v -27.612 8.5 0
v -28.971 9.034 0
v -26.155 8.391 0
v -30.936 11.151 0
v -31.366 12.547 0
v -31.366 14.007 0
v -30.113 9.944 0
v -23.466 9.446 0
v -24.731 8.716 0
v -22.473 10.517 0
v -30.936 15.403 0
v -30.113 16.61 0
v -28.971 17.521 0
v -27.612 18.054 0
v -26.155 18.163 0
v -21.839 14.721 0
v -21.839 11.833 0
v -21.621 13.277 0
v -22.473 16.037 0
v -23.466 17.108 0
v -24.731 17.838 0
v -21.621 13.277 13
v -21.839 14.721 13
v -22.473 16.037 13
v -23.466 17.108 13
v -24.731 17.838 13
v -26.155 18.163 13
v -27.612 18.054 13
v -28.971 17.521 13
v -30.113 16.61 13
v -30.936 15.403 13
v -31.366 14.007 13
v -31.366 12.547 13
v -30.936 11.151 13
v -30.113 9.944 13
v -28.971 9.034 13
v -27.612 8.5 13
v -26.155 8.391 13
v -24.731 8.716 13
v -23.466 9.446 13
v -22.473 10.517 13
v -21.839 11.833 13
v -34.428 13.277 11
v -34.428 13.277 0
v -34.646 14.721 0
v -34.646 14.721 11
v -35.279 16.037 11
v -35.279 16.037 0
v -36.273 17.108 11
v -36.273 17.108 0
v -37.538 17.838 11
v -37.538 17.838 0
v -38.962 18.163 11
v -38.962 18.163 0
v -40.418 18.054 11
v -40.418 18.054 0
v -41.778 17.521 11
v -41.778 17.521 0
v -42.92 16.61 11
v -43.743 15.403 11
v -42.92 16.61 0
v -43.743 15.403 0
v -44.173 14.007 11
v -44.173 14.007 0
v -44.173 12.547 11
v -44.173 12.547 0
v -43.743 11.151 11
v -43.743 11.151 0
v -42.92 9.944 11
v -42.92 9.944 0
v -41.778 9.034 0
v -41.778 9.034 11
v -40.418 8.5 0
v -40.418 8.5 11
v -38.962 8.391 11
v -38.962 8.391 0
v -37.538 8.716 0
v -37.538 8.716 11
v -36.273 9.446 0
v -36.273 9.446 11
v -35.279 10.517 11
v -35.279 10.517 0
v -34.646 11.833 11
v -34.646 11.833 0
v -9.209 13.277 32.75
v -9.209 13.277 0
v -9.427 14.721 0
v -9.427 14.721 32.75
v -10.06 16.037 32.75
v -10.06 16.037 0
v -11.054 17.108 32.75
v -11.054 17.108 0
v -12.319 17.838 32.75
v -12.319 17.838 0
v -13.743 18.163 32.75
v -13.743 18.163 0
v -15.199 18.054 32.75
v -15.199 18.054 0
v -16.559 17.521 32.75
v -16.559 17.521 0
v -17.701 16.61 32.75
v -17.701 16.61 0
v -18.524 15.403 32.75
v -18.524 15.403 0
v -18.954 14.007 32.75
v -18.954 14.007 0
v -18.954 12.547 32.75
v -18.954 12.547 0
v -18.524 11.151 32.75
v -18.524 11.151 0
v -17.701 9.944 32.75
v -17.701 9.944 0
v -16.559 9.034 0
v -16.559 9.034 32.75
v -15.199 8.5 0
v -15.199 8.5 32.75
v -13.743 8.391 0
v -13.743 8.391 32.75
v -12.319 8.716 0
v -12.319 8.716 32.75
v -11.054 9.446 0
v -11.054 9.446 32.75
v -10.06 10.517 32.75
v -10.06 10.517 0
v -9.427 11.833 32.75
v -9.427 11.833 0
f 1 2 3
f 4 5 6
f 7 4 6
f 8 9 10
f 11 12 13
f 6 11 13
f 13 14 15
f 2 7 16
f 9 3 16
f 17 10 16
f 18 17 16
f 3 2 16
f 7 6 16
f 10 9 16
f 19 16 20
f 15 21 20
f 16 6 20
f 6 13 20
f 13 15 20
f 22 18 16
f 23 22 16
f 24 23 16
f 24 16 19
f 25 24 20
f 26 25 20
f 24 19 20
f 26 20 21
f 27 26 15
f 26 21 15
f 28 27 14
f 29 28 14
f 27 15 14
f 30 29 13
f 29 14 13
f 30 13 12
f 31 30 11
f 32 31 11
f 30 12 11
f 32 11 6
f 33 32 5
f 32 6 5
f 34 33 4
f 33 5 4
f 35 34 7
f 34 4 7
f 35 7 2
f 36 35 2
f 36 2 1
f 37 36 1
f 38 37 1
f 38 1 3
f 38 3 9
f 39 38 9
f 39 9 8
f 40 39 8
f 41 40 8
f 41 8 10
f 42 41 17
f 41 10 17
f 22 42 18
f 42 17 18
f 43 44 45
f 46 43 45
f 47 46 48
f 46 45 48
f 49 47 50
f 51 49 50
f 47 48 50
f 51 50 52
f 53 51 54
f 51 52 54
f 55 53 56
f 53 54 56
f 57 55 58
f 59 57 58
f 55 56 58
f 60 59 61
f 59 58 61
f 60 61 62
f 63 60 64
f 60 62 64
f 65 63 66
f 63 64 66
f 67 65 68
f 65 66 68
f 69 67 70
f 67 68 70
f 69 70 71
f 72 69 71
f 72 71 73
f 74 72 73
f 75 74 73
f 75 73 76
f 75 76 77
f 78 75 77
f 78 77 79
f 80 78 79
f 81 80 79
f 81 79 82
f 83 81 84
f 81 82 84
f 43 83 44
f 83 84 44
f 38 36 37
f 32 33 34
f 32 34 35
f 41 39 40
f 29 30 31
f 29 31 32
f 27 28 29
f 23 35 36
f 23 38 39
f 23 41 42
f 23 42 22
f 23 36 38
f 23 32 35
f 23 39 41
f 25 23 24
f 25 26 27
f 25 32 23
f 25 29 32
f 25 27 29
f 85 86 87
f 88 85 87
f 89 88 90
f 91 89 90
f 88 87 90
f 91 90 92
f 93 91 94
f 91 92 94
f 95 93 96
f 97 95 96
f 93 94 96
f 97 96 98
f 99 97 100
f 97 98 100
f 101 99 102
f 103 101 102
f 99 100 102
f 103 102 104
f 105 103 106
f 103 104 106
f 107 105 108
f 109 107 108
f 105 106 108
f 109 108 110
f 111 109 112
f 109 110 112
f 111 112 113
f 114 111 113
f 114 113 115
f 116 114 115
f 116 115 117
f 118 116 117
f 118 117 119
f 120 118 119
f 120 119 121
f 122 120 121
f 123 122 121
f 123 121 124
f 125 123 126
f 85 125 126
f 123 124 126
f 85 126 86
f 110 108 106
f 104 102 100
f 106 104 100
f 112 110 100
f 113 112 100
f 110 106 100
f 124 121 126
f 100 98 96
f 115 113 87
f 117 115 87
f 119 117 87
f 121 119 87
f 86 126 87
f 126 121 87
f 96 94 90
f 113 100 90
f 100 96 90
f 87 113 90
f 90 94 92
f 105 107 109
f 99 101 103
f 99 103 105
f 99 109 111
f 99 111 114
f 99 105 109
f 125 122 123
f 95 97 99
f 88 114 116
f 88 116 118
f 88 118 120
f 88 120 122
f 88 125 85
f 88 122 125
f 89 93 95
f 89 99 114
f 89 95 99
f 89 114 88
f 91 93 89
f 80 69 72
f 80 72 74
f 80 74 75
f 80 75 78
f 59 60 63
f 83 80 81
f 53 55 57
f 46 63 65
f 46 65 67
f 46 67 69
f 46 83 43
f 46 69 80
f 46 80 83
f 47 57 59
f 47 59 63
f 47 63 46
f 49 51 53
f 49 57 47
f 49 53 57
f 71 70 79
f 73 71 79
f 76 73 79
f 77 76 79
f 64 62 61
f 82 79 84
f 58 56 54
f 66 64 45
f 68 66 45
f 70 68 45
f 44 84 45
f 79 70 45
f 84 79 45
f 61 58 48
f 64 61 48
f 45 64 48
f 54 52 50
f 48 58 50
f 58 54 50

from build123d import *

# Parameters (mm, degrees)
F0_R     = 4.9
F1_DEPTH = 11
F2_DEPTH = 13
F3_DEPTH = 32.75


with BuildPart() as f1:
    # F0 (on Top) → F1 (new body)
    with BuildSketch(Plane.XY):
        with Locations((-39.327952, 13.27707)):
            Circle(F0_R)
    extrude(amount=F1_DEPTH)


with BuildPart() as f2:
    # F0 (on Top) → F2 (new body)
    with BuildSketch(Plane.XY):
        with Locations((-26.521225, 13.27707)):
            Circle(F0_R)
    extrude(amount=F2_DEPTH)


with BuildPart() as f3:
    # F0 (on Top) → F3 (new body)
    with BuildSketch(Plane.XY):
        with Locations((-14.10906, 13.27707)):
            Circle(F0_R)
    extrude(amount=F3_DEPTH)


solid = Compound([f1.part, f2.part, f3.part])
